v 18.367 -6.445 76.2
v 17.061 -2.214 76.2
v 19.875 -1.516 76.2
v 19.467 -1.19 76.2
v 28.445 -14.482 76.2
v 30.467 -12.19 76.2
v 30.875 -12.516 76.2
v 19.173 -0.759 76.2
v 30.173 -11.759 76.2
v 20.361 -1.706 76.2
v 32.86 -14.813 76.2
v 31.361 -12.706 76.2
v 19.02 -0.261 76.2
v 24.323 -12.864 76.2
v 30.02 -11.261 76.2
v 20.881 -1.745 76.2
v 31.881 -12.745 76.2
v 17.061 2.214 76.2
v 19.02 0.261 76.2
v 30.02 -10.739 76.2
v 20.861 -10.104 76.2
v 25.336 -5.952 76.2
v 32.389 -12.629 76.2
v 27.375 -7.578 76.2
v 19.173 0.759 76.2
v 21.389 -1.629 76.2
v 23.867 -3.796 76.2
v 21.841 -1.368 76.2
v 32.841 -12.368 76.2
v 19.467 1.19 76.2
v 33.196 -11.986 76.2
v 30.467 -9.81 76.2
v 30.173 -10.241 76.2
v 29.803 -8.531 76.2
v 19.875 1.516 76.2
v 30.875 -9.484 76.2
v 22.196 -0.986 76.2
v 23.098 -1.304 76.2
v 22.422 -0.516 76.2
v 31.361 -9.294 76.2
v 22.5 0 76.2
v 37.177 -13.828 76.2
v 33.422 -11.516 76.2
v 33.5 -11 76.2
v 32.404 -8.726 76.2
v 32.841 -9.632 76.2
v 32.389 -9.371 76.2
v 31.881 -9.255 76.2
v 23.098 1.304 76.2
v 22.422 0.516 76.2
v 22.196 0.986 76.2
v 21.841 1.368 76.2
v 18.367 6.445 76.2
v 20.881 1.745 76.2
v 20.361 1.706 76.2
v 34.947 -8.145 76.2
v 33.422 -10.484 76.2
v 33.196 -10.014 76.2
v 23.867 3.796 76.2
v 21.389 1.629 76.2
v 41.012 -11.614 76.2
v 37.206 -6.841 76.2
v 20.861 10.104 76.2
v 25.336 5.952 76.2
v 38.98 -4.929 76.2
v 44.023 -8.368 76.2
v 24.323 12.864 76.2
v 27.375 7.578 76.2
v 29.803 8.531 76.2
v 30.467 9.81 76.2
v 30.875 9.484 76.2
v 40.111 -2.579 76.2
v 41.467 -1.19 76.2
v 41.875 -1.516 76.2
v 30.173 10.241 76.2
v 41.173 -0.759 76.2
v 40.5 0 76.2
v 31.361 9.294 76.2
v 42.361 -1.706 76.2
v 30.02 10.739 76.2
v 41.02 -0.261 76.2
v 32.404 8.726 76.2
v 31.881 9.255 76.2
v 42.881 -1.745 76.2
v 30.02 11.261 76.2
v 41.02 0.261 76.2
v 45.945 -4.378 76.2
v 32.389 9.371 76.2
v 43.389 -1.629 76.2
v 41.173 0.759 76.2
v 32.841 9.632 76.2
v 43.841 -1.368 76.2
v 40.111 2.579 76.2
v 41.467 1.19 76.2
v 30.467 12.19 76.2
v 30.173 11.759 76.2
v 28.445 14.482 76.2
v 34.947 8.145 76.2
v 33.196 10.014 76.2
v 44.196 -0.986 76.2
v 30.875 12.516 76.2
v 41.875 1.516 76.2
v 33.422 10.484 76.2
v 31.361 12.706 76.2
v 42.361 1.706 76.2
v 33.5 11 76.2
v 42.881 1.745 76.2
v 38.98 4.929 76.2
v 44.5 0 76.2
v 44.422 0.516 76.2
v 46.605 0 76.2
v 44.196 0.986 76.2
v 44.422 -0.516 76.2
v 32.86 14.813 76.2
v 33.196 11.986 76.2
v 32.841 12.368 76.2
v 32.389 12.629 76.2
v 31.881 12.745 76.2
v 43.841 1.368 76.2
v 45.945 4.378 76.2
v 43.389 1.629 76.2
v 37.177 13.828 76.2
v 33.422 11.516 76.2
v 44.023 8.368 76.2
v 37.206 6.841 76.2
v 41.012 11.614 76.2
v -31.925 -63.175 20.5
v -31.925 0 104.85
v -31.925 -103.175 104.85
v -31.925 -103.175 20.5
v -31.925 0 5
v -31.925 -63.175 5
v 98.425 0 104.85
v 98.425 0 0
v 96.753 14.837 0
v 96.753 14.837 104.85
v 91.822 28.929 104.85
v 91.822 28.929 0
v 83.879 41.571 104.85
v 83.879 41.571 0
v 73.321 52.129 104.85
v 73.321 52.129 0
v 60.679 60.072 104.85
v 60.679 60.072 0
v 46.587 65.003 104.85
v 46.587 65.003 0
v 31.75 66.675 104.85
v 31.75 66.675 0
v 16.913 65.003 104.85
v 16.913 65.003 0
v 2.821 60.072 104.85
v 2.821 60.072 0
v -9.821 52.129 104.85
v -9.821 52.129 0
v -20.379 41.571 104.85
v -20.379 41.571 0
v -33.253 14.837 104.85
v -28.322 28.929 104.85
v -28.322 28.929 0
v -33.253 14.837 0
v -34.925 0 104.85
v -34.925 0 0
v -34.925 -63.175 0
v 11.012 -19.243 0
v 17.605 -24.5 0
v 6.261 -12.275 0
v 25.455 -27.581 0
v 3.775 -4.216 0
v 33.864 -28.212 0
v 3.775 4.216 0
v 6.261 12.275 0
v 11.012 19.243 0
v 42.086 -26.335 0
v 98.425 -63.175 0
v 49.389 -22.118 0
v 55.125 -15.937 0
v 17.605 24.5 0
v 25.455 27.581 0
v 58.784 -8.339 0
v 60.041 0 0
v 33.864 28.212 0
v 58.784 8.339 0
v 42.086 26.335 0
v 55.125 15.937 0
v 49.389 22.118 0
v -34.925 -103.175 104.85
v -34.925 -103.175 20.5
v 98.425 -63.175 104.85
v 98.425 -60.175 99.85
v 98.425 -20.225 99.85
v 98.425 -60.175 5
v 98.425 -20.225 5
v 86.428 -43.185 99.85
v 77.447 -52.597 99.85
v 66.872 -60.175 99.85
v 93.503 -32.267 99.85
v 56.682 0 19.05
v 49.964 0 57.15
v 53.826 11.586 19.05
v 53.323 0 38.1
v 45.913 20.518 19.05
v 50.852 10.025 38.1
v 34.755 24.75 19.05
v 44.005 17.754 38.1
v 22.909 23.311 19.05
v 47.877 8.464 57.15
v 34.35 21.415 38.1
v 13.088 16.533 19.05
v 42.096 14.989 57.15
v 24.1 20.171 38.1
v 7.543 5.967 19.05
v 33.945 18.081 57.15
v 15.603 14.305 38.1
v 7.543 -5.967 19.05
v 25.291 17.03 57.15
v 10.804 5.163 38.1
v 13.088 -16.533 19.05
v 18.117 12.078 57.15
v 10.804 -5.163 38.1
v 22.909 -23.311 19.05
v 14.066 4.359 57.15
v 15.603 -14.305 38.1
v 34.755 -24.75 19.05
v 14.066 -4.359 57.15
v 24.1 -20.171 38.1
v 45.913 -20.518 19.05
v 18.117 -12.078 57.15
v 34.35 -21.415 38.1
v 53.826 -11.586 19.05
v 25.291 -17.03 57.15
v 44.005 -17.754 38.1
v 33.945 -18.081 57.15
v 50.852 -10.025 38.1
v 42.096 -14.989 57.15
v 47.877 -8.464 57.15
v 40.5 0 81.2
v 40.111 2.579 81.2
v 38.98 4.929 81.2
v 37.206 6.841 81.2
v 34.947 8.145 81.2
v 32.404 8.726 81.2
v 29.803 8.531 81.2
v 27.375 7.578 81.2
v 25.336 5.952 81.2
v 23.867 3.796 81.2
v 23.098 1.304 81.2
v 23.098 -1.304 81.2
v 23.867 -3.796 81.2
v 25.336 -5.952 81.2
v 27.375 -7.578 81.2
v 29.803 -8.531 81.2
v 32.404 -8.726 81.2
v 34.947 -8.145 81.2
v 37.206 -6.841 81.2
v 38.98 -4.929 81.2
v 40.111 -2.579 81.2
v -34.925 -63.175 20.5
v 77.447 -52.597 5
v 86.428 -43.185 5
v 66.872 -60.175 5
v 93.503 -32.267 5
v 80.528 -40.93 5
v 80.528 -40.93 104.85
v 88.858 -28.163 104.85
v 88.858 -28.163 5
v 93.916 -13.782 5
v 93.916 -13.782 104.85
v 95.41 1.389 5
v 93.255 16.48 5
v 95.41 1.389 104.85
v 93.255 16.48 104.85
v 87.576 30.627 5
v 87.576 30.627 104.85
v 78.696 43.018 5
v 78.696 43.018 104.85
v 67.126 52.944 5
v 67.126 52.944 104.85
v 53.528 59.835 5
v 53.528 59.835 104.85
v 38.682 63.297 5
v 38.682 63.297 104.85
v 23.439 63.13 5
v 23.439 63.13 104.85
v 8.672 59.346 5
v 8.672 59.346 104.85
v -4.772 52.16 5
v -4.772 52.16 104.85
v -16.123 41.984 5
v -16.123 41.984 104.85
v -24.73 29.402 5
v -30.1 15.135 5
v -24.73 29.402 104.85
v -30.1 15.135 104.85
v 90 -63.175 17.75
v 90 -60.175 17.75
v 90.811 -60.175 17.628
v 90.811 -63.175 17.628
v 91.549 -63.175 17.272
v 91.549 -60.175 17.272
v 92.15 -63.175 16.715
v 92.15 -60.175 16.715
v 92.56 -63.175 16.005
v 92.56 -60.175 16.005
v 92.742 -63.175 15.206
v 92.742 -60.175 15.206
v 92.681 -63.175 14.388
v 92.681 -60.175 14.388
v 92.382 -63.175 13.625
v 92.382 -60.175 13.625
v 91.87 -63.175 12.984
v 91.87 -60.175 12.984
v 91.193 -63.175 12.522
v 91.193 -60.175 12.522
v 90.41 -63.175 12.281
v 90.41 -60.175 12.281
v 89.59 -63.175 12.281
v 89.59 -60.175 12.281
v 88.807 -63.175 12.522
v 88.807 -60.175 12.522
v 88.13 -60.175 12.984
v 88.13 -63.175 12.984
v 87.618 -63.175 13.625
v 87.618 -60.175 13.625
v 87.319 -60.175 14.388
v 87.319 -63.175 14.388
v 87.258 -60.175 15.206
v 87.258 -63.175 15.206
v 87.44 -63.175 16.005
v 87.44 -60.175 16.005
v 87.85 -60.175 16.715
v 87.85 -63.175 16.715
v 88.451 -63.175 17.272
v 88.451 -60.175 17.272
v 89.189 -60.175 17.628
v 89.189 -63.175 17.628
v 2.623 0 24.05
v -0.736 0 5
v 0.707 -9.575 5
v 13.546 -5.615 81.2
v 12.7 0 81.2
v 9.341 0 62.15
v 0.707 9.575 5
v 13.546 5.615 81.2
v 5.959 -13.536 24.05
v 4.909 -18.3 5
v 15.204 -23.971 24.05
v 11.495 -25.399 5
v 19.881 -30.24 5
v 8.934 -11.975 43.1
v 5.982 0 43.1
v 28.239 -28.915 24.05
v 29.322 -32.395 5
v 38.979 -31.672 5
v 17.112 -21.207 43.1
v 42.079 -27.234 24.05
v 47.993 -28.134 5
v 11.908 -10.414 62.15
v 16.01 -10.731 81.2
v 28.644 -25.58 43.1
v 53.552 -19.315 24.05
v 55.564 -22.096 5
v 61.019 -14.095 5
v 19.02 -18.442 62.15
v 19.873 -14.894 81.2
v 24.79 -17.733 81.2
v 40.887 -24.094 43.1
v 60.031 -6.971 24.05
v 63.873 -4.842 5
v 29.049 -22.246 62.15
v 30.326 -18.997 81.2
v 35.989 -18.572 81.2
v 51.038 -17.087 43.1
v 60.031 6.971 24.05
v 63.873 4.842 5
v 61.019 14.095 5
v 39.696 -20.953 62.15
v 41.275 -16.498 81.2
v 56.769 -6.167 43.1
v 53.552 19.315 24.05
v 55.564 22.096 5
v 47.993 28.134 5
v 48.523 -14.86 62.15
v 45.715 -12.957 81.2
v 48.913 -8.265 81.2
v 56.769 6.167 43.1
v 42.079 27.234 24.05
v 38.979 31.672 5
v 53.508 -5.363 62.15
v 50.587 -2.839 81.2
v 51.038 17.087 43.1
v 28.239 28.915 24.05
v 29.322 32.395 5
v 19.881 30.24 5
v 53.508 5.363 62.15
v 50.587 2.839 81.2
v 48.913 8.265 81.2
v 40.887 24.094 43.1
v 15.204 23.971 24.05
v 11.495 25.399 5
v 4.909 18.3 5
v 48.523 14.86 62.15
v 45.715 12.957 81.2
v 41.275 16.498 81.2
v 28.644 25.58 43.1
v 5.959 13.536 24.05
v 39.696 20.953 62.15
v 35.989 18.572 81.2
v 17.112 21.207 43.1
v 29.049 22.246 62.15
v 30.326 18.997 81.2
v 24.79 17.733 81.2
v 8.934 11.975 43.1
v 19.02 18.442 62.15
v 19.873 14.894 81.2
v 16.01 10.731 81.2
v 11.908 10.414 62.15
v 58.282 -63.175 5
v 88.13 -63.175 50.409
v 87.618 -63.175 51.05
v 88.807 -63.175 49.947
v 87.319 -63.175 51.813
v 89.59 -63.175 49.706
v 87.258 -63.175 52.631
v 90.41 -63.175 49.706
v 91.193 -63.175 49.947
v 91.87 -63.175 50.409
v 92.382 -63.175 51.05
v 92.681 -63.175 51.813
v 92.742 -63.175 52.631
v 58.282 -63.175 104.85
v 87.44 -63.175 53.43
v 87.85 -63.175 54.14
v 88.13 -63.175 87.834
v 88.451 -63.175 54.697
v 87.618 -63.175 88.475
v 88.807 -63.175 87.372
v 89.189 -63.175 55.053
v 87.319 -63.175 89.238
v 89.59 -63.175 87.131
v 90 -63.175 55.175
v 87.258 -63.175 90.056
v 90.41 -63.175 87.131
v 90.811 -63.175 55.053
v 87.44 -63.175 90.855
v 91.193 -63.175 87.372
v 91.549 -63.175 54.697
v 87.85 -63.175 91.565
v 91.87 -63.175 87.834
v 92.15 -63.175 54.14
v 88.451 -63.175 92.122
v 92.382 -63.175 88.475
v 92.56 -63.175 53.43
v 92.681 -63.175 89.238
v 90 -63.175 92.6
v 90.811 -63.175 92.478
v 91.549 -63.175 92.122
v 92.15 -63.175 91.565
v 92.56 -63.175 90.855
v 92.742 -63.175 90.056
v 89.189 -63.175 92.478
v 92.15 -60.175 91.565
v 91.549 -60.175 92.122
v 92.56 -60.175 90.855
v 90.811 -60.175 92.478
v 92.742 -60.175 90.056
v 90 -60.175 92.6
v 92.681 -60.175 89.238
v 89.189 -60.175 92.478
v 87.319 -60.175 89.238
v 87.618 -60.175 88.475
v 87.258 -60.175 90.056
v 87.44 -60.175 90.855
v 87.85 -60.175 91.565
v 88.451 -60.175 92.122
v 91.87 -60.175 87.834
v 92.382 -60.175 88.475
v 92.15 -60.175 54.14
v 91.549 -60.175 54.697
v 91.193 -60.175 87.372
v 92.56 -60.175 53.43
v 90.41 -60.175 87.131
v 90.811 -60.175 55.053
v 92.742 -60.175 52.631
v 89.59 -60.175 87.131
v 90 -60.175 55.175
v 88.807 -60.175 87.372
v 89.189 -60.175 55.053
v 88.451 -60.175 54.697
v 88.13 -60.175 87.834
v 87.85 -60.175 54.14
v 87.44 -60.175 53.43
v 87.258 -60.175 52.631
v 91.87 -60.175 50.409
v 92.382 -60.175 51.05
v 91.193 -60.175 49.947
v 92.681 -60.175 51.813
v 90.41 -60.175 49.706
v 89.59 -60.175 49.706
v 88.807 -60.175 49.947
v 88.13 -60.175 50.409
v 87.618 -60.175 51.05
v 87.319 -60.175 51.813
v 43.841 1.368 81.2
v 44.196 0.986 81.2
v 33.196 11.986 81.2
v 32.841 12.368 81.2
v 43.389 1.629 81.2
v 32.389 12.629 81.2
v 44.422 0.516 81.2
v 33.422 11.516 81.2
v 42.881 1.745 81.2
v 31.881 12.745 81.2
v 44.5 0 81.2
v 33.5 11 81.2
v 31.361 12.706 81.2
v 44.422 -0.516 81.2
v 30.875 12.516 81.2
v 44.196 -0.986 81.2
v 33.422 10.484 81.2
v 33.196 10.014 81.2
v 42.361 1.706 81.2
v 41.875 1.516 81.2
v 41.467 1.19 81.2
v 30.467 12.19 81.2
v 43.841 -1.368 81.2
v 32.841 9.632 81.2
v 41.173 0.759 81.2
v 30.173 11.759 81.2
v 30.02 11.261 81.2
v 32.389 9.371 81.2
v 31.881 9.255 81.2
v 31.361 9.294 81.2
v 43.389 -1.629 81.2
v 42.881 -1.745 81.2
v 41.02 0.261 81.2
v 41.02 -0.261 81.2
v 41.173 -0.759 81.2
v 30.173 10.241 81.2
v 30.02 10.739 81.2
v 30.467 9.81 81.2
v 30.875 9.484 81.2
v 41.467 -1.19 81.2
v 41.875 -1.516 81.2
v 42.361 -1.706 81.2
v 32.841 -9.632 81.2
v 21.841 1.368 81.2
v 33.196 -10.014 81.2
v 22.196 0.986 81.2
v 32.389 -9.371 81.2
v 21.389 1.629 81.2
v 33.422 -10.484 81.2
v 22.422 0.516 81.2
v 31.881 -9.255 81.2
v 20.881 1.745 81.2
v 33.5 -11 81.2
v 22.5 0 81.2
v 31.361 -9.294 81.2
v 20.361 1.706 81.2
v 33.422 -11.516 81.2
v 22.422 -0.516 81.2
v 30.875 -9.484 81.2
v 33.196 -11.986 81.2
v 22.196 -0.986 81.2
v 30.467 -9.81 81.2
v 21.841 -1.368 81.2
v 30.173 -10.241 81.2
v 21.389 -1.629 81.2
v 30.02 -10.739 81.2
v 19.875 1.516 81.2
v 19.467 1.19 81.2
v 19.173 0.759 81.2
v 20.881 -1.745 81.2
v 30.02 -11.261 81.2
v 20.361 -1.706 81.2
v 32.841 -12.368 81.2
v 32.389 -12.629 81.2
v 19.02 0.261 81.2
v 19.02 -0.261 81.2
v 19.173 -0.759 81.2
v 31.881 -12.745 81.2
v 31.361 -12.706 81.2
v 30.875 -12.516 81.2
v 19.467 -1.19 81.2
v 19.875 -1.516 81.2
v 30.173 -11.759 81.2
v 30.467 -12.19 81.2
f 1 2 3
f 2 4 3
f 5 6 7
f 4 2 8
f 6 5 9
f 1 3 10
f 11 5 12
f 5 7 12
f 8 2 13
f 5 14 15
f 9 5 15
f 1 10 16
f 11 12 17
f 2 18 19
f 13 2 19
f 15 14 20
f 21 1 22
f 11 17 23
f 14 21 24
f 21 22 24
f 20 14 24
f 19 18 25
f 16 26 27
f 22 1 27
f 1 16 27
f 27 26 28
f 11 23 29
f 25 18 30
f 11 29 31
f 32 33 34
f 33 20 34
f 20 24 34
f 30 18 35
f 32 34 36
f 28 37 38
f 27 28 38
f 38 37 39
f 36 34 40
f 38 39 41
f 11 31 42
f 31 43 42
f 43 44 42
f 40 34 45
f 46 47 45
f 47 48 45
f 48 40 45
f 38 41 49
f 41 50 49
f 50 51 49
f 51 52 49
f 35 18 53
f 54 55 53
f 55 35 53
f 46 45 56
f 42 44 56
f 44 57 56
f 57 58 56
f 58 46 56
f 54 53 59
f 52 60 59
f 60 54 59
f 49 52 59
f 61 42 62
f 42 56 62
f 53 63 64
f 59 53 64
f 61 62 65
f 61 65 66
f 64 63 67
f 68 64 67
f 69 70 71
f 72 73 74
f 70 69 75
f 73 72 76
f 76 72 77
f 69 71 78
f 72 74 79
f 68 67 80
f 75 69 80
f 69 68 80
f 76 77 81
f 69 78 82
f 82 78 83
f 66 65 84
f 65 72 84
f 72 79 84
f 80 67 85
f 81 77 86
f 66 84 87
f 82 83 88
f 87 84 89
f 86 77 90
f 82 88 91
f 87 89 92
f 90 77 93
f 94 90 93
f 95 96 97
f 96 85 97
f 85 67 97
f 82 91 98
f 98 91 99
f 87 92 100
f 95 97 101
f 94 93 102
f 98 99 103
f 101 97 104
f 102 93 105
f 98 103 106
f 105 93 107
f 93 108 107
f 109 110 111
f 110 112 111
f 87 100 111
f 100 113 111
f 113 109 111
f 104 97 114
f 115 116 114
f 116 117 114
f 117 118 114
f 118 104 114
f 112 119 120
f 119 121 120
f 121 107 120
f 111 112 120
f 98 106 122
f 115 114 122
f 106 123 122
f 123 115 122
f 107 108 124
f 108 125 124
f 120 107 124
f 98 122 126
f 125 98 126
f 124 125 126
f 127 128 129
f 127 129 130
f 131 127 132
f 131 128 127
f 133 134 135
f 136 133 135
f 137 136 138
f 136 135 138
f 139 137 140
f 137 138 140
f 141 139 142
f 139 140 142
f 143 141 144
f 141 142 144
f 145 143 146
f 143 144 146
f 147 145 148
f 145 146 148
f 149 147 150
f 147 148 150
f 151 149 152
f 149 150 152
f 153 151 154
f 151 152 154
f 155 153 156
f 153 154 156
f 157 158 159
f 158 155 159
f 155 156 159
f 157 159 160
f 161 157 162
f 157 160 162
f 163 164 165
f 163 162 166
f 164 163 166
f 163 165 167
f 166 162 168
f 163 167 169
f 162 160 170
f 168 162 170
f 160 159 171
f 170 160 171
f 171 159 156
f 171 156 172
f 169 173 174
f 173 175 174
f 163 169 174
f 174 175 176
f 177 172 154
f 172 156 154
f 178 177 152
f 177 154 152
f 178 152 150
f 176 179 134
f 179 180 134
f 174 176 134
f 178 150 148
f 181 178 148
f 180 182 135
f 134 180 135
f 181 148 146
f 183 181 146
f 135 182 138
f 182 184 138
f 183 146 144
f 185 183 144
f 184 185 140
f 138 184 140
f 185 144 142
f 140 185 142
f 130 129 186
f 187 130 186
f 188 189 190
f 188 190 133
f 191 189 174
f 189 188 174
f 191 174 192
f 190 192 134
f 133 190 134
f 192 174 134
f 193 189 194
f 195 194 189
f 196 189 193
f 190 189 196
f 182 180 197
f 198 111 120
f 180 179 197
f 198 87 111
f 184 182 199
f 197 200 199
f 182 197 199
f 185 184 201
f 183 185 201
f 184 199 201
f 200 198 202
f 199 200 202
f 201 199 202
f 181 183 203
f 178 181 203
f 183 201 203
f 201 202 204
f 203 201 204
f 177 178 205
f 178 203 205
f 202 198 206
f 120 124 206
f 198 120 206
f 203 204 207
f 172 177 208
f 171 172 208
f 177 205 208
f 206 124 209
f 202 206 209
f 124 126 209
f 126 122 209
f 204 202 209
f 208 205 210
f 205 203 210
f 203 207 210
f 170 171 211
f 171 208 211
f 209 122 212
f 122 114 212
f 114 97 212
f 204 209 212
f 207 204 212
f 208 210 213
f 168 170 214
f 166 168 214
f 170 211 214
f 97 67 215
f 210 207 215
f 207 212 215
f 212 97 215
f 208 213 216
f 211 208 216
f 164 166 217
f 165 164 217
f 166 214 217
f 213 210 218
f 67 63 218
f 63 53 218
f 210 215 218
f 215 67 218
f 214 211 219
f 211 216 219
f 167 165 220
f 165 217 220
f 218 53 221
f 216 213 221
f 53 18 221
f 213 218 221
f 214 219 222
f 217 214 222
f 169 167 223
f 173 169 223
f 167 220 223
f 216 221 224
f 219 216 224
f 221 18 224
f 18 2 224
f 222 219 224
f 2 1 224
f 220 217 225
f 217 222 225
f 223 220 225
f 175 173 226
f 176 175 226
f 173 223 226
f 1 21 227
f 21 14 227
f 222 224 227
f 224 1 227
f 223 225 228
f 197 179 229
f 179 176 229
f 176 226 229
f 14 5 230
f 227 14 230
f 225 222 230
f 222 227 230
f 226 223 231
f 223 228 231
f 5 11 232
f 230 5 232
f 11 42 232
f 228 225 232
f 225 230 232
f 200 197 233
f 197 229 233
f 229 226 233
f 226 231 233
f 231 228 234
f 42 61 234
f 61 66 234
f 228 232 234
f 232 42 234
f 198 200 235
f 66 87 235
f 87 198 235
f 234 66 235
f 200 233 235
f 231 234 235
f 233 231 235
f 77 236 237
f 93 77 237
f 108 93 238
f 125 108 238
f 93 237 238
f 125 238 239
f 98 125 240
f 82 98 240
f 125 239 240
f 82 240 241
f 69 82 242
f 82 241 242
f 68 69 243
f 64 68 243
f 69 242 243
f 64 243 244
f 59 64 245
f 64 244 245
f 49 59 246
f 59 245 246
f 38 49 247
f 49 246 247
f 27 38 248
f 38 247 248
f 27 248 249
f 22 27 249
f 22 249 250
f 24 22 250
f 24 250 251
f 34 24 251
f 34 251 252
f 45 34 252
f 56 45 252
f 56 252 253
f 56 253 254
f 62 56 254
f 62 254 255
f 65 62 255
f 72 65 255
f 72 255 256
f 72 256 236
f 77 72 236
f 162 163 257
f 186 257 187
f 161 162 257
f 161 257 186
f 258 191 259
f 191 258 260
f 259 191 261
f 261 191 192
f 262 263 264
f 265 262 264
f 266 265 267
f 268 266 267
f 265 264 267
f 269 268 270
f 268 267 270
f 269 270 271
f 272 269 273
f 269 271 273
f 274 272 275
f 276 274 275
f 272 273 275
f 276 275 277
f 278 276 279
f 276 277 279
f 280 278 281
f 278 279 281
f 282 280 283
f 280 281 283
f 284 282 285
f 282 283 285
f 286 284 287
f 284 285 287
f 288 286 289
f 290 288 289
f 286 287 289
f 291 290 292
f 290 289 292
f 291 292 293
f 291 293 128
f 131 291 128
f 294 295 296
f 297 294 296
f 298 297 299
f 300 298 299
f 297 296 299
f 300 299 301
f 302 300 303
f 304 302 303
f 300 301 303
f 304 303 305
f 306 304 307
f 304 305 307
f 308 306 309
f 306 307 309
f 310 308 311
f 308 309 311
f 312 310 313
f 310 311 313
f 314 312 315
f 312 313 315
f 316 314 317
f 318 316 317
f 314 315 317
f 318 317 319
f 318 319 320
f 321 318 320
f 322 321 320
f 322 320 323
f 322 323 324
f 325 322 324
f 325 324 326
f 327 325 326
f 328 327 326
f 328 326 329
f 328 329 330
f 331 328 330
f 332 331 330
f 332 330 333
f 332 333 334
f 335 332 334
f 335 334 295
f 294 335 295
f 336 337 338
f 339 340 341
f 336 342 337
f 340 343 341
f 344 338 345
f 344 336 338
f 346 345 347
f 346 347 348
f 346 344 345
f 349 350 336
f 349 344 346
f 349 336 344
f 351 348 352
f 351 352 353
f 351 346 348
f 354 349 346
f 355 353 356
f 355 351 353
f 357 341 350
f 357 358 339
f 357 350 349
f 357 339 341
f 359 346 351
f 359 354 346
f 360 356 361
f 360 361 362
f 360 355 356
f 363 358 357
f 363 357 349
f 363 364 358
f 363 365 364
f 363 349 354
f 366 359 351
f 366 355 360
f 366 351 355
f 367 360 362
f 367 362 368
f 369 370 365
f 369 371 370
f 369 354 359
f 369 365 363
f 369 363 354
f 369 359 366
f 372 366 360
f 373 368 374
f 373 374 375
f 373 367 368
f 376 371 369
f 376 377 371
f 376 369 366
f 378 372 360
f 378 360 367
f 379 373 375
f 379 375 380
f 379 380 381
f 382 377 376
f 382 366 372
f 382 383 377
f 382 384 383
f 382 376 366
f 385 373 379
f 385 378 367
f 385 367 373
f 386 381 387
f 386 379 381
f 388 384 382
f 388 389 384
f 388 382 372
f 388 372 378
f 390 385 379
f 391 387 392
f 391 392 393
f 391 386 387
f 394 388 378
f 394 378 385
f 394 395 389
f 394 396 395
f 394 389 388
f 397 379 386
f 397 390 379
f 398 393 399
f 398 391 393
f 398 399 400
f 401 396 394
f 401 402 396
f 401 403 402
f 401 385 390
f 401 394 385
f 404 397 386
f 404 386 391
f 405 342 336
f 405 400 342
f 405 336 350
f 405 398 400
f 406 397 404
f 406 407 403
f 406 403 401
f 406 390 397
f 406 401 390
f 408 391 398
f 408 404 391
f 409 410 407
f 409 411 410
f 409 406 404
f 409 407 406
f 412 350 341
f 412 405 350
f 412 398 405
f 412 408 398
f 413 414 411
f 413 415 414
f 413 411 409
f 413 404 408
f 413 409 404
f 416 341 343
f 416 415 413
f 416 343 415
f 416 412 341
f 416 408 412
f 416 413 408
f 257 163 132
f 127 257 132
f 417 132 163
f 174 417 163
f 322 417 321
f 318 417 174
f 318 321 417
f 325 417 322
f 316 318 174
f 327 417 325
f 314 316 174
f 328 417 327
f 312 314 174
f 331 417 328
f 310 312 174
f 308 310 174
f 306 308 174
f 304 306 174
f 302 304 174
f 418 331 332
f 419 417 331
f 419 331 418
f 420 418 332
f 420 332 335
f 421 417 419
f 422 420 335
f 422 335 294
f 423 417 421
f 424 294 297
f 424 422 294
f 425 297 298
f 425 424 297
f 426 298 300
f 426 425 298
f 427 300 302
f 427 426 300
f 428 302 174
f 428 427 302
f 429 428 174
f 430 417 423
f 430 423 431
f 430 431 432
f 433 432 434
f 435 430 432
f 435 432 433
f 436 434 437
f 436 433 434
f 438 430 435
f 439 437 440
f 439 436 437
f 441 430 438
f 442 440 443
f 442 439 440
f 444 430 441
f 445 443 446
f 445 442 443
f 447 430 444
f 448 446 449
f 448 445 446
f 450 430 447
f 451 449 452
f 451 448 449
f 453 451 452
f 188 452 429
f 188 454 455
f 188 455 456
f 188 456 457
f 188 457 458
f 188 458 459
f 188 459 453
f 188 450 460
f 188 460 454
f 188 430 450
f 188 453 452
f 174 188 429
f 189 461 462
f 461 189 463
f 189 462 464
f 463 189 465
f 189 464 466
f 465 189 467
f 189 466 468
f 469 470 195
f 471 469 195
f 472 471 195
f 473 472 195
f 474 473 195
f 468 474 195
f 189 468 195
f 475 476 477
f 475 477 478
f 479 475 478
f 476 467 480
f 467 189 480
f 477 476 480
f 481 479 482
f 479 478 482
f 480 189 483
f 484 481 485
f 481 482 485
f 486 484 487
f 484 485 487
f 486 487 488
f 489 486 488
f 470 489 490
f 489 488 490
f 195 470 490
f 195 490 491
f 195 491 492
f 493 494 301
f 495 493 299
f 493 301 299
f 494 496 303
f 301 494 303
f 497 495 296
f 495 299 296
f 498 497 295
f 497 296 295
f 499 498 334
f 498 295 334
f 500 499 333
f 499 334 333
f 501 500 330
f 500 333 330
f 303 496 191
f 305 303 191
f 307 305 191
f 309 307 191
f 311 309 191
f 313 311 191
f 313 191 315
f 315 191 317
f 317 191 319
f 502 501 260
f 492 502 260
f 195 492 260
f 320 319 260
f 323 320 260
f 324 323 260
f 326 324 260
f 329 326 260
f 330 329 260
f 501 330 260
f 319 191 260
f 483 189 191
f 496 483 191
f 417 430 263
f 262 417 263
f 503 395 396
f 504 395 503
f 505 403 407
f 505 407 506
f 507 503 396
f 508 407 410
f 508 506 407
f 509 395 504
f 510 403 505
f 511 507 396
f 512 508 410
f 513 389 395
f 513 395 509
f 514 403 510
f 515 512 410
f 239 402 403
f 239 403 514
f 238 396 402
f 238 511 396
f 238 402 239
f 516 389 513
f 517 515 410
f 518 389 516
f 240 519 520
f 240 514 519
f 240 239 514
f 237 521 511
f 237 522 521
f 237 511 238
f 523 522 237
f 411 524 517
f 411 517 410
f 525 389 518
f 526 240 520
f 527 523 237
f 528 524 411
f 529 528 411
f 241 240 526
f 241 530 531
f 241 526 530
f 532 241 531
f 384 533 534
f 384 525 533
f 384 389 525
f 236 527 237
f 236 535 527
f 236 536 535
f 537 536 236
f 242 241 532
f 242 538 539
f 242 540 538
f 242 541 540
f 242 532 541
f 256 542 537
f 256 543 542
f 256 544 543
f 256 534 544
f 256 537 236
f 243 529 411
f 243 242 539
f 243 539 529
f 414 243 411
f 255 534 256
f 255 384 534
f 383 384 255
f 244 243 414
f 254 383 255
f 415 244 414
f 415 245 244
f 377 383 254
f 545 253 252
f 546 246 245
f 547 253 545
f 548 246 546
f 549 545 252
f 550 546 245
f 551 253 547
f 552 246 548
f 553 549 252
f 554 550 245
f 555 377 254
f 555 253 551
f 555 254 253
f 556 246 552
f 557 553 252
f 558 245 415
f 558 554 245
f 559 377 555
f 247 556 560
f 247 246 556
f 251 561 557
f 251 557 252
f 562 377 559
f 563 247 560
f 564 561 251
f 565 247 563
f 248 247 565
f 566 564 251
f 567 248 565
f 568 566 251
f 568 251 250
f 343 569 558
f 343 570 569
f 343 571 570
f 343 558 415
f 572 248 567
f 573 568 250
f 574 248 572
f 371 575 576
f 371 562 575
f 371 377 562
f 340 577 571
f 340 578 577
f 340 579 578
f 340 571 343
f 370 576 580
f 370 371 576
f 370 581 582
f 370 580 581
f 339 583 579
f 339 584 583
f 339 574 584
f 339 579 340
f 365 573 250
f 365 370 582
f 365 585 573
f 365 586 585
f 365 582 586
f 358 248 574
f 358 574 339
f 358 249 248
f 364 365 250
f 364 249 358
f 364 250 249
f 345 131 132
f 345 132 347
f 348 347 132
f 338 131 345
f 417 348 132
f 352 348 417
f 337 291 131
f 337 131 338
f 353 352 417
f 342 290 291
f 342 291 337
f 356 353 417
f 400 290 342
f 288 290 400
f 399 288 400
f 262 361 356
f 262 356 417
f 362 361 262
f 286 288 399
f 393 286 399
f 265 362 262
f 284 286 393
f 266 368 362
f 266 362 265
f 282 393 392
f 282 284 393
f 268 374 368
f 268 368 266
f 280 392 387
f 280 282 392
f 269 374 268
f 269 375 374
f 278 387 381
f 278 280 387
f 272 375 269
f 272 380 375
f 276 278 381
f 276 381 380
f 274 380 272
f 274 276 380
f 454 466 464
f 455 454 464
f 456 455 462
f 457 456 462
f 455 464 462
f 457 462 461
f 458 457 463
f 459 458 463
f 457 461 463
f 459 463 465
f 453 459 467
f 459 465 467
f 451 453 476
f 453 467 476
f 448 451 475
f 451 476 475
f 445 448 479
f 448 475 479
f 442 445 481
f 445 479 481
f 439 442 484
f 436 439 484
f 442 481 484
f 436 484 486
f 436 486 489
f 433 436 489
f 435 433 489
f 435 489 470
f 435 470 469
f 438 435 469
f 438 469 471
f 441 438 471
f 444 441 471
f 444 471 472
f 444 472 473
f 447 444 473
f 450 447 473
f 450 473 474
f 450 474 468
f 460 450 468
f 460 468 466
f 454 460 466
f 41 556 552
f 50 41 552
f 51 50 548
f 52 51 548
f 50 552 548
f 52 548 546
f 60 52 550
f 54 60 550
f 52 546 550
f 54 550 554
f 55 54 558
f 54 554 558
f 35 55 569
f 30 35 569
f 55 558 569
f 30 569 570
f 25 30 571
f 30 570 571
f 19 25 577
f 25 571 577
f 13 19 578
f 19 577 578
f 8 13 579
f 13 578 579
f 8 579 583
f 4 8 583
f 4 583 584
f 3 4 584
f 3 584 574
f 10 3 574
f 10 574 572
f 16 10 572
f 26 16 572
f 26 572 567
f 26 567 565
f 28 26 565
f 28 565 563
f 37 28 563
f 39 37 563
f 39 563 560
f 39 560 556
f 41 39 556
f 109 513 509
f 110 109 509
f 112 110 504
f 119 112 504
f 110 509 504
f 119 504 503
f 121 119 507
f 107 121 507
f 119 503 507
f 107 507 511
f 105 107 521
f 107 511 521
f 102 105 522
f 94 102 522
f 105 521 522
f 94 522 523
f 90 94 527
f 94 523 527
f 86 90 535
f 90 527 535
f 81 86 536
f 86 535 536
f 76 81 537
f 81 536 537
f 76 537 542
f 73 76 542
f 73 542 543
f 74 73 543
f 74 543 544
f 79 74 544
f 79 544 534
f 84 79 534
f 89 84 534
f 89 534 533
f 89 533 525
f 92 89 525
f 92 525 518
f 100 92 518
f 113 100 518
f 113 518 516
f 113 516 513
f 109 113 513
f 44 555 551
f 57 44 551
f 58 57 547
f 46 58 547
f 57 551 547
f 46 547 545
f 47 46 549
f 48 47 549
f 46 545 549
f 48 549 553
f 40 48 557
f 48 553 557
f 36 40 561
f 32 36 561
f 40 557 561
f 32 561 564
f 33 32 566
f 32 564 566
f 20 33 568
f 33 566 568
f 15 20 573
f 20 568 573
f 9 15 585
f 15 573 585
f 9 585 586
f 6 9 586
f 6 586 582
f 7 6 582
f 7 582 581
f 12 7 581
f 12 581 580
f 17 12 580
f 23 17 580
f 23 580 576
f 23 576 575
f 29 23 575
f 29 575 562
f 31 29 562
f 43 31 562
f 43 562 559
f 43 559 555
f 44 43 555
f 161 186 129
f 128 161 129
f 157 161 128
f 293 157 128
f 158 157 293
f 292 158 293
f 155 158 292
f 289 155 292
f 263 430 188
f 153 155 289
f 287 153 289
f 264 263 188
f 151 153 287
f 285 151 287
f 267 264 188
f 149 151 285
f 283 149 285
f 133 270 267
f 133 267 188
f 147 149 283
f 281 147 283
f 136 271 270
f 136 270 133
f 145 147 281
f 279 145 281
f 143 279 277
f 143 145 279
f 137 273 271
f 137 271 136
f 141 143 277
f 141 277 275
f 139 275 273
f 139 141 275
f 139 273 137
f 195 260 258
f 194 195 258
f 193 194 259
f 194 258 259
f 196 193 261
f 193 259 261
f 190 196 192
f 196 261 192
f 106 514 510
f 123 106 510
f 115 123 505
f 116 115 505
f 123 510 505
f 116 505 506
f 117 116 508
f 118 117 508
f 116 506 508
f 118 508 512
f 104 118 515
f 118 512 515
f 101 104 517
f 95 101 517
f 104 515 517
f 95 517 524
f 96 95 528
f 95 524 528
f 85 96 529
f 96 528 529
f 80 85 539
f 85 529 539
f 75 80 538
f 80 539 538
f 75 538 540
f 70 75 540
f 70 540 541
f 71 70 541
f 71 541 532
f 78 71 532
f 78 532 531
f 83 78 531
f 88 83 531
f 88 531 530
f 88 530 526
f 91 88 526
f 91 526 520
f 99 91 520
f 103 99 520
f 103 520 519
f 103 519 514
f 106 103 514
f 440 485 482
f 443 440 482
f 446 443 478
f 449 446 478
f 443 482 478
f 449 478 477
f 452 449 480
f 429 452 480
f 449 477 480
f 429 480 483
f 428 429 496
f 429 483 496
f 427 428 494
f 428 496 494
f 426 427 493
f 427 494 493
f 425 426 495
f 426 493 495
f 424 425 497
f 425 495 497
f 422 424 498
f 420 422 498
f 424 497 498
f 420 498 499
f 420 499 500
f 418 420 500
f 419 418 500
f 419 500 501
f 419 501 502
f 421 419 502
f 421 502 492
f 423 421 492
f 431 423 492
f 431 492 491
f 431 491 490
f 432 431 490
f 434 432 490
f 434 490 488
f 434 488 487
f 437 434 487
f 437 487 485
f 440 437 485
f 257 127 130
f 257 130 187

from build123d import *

# Parameters (mm, degrees)
BOSS_EXTRUDE1_DEPTH = 104.85
CUT_EXTRUDE1_REACH  = 178.992
CUT_EXTRUDE2_REACH  = 178.992
SKETCH3_R           = 2.665000000000001
BOSS_EXTRUDE2_DEPTH = 104.85
CUT_EXTRUDE3_REACH  = 178.992
SKETCH6_W           = 66.67499999999998
SKETCH6_H           = 36.500000000000014
CUT_EXTRUDE4_DEPTH  = 3.5
CUT_EXTRUDE5_DEPTH  = 94.850000094
SKETCH9_R           = 2.7500000000000084
SKETCH9_R_2         = 2.750000000000008
CUT_EXTRUDE6_DEPTH  = 5
CUT_EXTRUDE7_DEPTH  = 99.85
BOSS_EXTRUDE3_DEPTH = 40
SKETCH12_R          = 19.05
BOSS_EXTRUDE4_DEPTH = 76.2
CHAMFER1_SIZE       = 13.43611593
CHAMFER1_SIZE_2     = 76.2
CUT_EXTRUDE8_REACH  = 166.091
SKETCH13_R          = 8.750000000000004
CUT_EXTRUDE9_REACH  = 166.091
SKETCH14_R          = 1.7500000000000038
SKETCH14_R_2        = 1.7500000000000067
SKETCH14_R_3        = 1.7499999999999987


# Read off the part's stored shape, not the designer's step: Shell1
with BuildPart() as part:
    # Sketch1 → Boss-Extrude1 (new body)
    with BuildSketch(Plane.XY):
        with BuildLine():
            Line((-34.925, 0), (-34.92499999999999, -63.5))
            Line((-34.92499999999999, -63.5), (-34.92499999999998, -103.175))
            Line((-34.92499999999998, -103.175), (98.425, -103.175))
            Line((98.425, -103.175), (98.42499999999998, -64.83388883768319))
            Line((98.42499999999998, -64.83388883768319), (98.425, 0))
            ThreePointArc((98.425, 0), (31.750000000000004, 66.675), (-34.925, 0))
        make_face()
    extrude(amount=BOSS_EXTRUDE1_DEPTH)

    # Sketch2 → Cut-Extrude1 (cut, up to next)
    with BuildSketch(Plane.XY.offset(104.85), mode=Mode.PRIVATE) as cut_extrude1_sk1:
        with BuildLine():
            Line((31.75, -66.675), (31.75, -103.175))
            Line((31.75, -103.175), (98.425, -103.175))
            Line((98.425, -103.175), (98.425, 0))
            ThreePointArc((98.425, 0), (78.89634463561305, -47.14634463561305), (31.75, -66.675))
        make_face()
    cut_extrude1_tool1 = extrude(cut_extrude1_sk1.sketch, amount=-CUT_EXTRUDE1_REACH, mode=Mode.PRIVATE) & part.part
    add(cut_extrude1_tool1.solids().sort_by_distance((70.281775, -75.59134, 104.85))[0], mode=Mode.SUBTRACT)

    # Sketch3 → Cut-Extrude2 (cut, up to next)
    with BuildSketch(Plane(origin=(0, 0, 0), x_dir=(-1, 0, 0), z_dir=(0, 0, -1)), mode=Mode.PRIVATE) as cut_extrude2_sk1:
        with Locations((-21.75, -93.17500000000001)):
            Circle(SKETCH3_R)
    cut_extrude2_tool1 = extrude(cut_extrude2_sk1.sketch, amount=-CUT_EXTRUDE2_REACH, mode=Mode.PRIVATE) & part.part
    # Sketch3 → Cut-Extrude2 (cut, up to next)
    with BuildSketch(Plane(origin=(0, 0, 0), x_dir=(-1, 0, 0), z_dir=(0, 0, -1)), mode=Mode.PRIVATE) as cut_extrude2_sk2:
        with Locations(Location((-21.75, -73.17499999999998, 0), (0, 0, 180))):
            Circle(SKETCH3_R)
    cut_extrude2_tool2 = extrude(cut_extrude2_sk2.sketch, amount=-CUT_EXTRUDE2_REACH, mode=Mode.PRIVATE) & part.part
    # Sketch3 → Cut-Extrude2 (cut, up to next)
    with BuildSketch(Plane(origin=(0, 0, 0), x_dir=(-1, 0, 0), z_dir=(0, 0, -1)), mode=Mode.PRIVATE) as cut_extrude2_sk3:
        with Locations(Location((24.924999999999997, -93.17500000000001, 0), (0, 0, 180))):
            Circle(SKETCH3_R)
    cut_extrude2_tool3 = extrude(cut_extrude2_sk3.sketch, amount=-CUT_EXTRUDE2_REACH, mode=Mode.PRIVATE) & part.part
    # Sketch3 → Cut-Extrude2 (cut, up to next)
    with BuildSketch(Plane(origin=(0, 0, 0), x_dir=(-1, 0, 0), z_dir=(0, 0, -1)), mode=Mode.PRIVATE) as cut_extrude2_sk4:
        with Locations((24.924999999999997, -73.17499999999998)):
            Circle(SKETCH3_R)
    cut_extrude2_tool4 = extrude(cut_extrude2_sk4.sketch, amount=-CUT_EXTRUDE2_REACH, mode=Mode.PRIVATE) & part.part
    add(cut_extrude2_tool1.solids().sort_by_distance((21.75, -93.175, 0))[0], mode=Mode.SUBTRACT)
    add(cut_extrude2_tool2.solids().sort_by_distance((21.75, -73.175, 0))[0], mode=Mode.SUBTRACT)
    add(cut_extrude2_tool3.solids().sort_by_distance((-24.925, -93.175, 0))[0], mode=Mode.SUBTRACT)
    add(cut_extrude2_tool4.solids().sort_by_distance((-24.925, -73.175, 0))[0], mode=Mode.SUBTRACT)

    # Sketch5 → Boss-Extrude2 (add)
    with BuildSketch(Plane(origin=(0, 0, 0), x_dir=(-1, 0, 0), z_dir=(0, 0, -1))):
        with BuildLine():
            Line((-31.75, -66.675), (-98.425, -66.675))
            Line((-98.425, -66.675), (-98.425, -4.6559e-13))
            ThreePointArc((-98.425, -4.6559e-13), (-78.89634463561288, -47.146344635613225), (-31.75, -66.675))
        make_face()
    extrude(amount=-BOSS_EXTRUDE2_DEPTH)

    # Sketch6 → Cut-Extrude3 (cut, up to next)
    with BuildSketch(Plane(origin=(0, 0, 0), x_dir=(-1, 0, 0), z_dir=(0, 0, -1)), mode=Mode.PRIVATE) as cut_extrude3_sk1:
        with Locations((1.5874999999999897, -84.92500000000001)):
            Rectangle(SKETCH6_W, SKETCH6_H)
    cut_extrude3_tool1 = extrude(cut_extrude3_sk1.sketch, amount=-CUT_EXTRUDE3_REACH, mode=Mode.PRIVATE) & part.part
    add(cut_extrude3_tool1.solids().sort_by_distance((-1.5875, -84.925, 0))[0], mode=Mode.SUBTRACT)

    # Sketch7 → Cut-Extrude4 (cut)
    with BuildSketch(Plane.XZ.offset(66.675)):
        Polygon((98.425, 0), (98.425, 104.85), (-34.92499999999999, 104.85), (-34.92499999999998, 0), align=None)
    extrude(amount=-CUT_EXTRUDE4_DEPTH, mode=Mode.SUBTRACT)

    # Sketch8 → Cut-Extrude5 (cut)
    with BuildSketch(Plane(origin=(0, 0, 4.999999905999999), x_dir=(-1, 0, 0), z_dir=(0, 0, -1))):
        with BuildLine():
            Line((-98.425, -20.224984548819855), (-98.425, -60.17499999999999))
            Line((-98.425, -60.17499999999999), (-66.87228637204589, -60.17499999999999))
            ThreePointArc((-66.87228637204589, -60.17500000000001), (-86.42790057980886, -43.18486787272293), (-98.42499999999998, -20.224984548819855))
        make_face()
    extrude(amount=-CUT_EXTRUDE5_DEPTH, mode=Mode.SUBTRACT)

    # Sketch9 → Cut-Extrude6 (cut)
    with BuildSketch(Plane(origin=(0, -60.17499999999999, 0), x_dir=(1, 0, 0), z_dir=(0, 1, 0))):
        with Locations(Location((89.99999999999999, -89.85, 0), (0, 0, 270))):
            Circle(SKETCH9_R)
        with Locations(Location((89.99999999999999, -14.999999906000001, 0), (0, 0, 270))):
            Circle(SKETCH9_R_2)
        with Locations(Location((89.99999999999999, -52.42499995300001, 0), (0, 0, 270))):
            Circle(SKETCH9_R)
    extrude(amount=-CUT_EXTRUDE6_DEPTH, mode=Mode.SUBTRACT)

    # Sketch10 → Cut-Extrude7 (cut)
    with BuildSketch(Plane.XY.offset(104.85)):
        with BuildLine():
            Line((58.2823809623914, -63.175), (80.527879915601, -40.92950104679029))
            ThreePointArc((80.527879915601, -40.92950104679029), (91.58492762854266, -21.778132626262114), (95.425, -4.6274e-13))
            ThreePointArc((95.42499999999998, -4.6803e-13), (31.75000000000024, 63.67499999999998), (-31.92499999999999, 1.274e-14))
            Line((-31.924999999999994, 7.8e-15), (-31.924999999999994, -63.175))
            Line((-31.924999999999994, -63.175), (31.750000000000004, -63.175))
            Line((31.75, -63.175), (58.2823809623914, -63.175))
        make_face()
    extrude(amount=-CUT_EXTRUDE7_DEPTH, mode=Mode.SUBTRACT)

    # Sketch11 → Boss-Extrude3 (add)
    with BuildSketch(Plane.XZ.offset(63.175)):
        Polygon((-34.92499999999999, 104.85), (-31.924999999999994, 104.85), (-31.924999999999994, 20.5), (-34.92499999999998, 20.5), align=None)
    extrude(amount=BOSS_EXTRUDE3_DEPTH)

    # Sketch12 → Boss-Extrude4 (add)
    with BuildSketch(Plane.XY.offset(5)):
        with Locations(Location((31.75, 0, 0), (0, 0, 180))):
            Circle(SKETCH12_R)
    extrude(amount=BOSS_EXTRUDE4_DEPTH)

    # Chamfer1
    # the kernel refuses this chamfer: 76.2, 13.43611593 mm, written as the material it adds along each edge
    with BuildSketch(Plane(origin=(31.75, 0, 5), x_dir=(-1, 1.2e-16, 0), z_dir=(1.2e-16, 1, 0))) as chamfer1_piece_1_section:
        Polygon((19.05 + CHAMFER1_SIZE, 0), (19.05, CHAMFER1_SIZE_2), (19.05, 0), align=None)
    chamfer1_piece_1 = revolve(axis=Axis((31.75, 0, 5), (0, 0, 1)), mode=Mode.PRIVATE)
    chamfer1_piece_1 = split(chamfer1_piece_1, bisect_by=Plane(origin=(57.33414853673409, -6.27e-15, 81.2), z_dir=(0, 0, -1)), keep=Keep.TOP, mode=Mode.PRIVATE)
    add(chamfer1_piece_1)

    # Shell1 outline → Shell1 (revolve, cut)
    with BuildSketch(Plane(origin=(31.75, 0, 0), x_dir=(1, 0, 0), z_dir=(0, -1, 0))):
        Polygon((14.854501844, 76.2), (0, 76.2), (0, 0), (28.290617774, 0), align=None)
    revolve(axis=Axis((31.75, 0, 0), (0, 0, 1)), mode=Mode.SUBTRACT)

    # Sketch13 → Cut-Extrude8 (cut, up to next)
    with BuildSketch(Plane.XY.offset(81.2), mode=Mode.PRIVATE) as cut_extrude8_sk1:
        with Locations((31.75, 0)):
            Circle(SKETCH13_R)
    cut_extrude8_tool1 = extrude(cut_extrude8_sk1.sketch, amount=-CUT_EXTRUDE8_REACH, mode=Mode.PRIVATE) & part.part
    add(cut_extrude8_tool1.solids().sort_by_distance((31.75, 0, 81.2))[0], mode=Mode.SUBTRACT)

    # Sketch14 → Cut-Extrude9 (cut, up to next)
    with BuildSketch(Plane.XY.offset(81.2), mode=Mode.PRIVATE) as cut_extrude9_sk1:
        with Locations((31.75, 10.999999999999993)):
            Circle(SKETCH14_R)
    cut_extrude9_tool1 = extrude(cut_extrude9_sk1.sketch, amount=-CUT_EXTRUDE9_REACH, mode=Mode.PRIVATE) & part.part
    # Sketch14 → Cut-Extrude9 (cut, up to next)
    with BuildSketch(Plane.XY.offset(81.2), mode=Mode.PRIVATE) as cut_extrude9_sk2:
        with Locations((42.75000000000015, 1.1102e-13)):
            Circle(SKETCH14_R)
    cut_extrude9_tool2 = extrude(cut_extrude9_sk2.sketch, amount=-CUT_EXTRUDE9_REACH, mode=Mode.PRIVATE) & part.part
    # Sketch14 → Cut-Extrude9 (cut, up to next)
    with BuildSketch(Plane.XY.offset(81.2), mode=Mode.PRIVATE) as cut_extrude9_sk3:
        with Locations((31.75000000000024, -10.999999999999993)):
            Circle(SKETCH14_R_2)
    cut_extrude9_tool3 = extrude(cut_extrude9_sk3.sketch, amount=-CUT_EXTRUDE9_REACH, mode=Mode.PRIVATE) & part.part
    # Sketch14 → Cut-Extrude9 (cut, up to next)
    with BuildSketch(Plane.XY.offset(81.2), mode=Mode.PRIVATE) as cut_extrude9_sk4:
        with Locations((20.75000000000016, -3.469e-14)):
            Circle(SKETCH14_R_3)
    cut_extrude9_tool4 = extrude(cut_extrude9_sk4.sketch, amount=-CUT_EXTRUDE9_REACH, mode=Mode.PRIVATE) & part.part
    add(cut_extrude9_tool1.solids().sort_by_distance((31.75, 11, 81.2))[0], mode=Mode.SUBTRACT)
    add(cut_extrude9_tool2.solids().sort_by_distance((42.75, 0, 81.2))[0], mode=Mode.SUBTRACT)
    add(cut_extrude9_tool3.solids().sort_by_distance((31.75, -11, 81.2))[0], mode=Mode.SUBTRACT)
    add(cut_extrude9_tool4.solids().sort_by_distance((20.75, 0, 81.2))[0], mode=Mode.SUBTRACT)


solid = part.part
